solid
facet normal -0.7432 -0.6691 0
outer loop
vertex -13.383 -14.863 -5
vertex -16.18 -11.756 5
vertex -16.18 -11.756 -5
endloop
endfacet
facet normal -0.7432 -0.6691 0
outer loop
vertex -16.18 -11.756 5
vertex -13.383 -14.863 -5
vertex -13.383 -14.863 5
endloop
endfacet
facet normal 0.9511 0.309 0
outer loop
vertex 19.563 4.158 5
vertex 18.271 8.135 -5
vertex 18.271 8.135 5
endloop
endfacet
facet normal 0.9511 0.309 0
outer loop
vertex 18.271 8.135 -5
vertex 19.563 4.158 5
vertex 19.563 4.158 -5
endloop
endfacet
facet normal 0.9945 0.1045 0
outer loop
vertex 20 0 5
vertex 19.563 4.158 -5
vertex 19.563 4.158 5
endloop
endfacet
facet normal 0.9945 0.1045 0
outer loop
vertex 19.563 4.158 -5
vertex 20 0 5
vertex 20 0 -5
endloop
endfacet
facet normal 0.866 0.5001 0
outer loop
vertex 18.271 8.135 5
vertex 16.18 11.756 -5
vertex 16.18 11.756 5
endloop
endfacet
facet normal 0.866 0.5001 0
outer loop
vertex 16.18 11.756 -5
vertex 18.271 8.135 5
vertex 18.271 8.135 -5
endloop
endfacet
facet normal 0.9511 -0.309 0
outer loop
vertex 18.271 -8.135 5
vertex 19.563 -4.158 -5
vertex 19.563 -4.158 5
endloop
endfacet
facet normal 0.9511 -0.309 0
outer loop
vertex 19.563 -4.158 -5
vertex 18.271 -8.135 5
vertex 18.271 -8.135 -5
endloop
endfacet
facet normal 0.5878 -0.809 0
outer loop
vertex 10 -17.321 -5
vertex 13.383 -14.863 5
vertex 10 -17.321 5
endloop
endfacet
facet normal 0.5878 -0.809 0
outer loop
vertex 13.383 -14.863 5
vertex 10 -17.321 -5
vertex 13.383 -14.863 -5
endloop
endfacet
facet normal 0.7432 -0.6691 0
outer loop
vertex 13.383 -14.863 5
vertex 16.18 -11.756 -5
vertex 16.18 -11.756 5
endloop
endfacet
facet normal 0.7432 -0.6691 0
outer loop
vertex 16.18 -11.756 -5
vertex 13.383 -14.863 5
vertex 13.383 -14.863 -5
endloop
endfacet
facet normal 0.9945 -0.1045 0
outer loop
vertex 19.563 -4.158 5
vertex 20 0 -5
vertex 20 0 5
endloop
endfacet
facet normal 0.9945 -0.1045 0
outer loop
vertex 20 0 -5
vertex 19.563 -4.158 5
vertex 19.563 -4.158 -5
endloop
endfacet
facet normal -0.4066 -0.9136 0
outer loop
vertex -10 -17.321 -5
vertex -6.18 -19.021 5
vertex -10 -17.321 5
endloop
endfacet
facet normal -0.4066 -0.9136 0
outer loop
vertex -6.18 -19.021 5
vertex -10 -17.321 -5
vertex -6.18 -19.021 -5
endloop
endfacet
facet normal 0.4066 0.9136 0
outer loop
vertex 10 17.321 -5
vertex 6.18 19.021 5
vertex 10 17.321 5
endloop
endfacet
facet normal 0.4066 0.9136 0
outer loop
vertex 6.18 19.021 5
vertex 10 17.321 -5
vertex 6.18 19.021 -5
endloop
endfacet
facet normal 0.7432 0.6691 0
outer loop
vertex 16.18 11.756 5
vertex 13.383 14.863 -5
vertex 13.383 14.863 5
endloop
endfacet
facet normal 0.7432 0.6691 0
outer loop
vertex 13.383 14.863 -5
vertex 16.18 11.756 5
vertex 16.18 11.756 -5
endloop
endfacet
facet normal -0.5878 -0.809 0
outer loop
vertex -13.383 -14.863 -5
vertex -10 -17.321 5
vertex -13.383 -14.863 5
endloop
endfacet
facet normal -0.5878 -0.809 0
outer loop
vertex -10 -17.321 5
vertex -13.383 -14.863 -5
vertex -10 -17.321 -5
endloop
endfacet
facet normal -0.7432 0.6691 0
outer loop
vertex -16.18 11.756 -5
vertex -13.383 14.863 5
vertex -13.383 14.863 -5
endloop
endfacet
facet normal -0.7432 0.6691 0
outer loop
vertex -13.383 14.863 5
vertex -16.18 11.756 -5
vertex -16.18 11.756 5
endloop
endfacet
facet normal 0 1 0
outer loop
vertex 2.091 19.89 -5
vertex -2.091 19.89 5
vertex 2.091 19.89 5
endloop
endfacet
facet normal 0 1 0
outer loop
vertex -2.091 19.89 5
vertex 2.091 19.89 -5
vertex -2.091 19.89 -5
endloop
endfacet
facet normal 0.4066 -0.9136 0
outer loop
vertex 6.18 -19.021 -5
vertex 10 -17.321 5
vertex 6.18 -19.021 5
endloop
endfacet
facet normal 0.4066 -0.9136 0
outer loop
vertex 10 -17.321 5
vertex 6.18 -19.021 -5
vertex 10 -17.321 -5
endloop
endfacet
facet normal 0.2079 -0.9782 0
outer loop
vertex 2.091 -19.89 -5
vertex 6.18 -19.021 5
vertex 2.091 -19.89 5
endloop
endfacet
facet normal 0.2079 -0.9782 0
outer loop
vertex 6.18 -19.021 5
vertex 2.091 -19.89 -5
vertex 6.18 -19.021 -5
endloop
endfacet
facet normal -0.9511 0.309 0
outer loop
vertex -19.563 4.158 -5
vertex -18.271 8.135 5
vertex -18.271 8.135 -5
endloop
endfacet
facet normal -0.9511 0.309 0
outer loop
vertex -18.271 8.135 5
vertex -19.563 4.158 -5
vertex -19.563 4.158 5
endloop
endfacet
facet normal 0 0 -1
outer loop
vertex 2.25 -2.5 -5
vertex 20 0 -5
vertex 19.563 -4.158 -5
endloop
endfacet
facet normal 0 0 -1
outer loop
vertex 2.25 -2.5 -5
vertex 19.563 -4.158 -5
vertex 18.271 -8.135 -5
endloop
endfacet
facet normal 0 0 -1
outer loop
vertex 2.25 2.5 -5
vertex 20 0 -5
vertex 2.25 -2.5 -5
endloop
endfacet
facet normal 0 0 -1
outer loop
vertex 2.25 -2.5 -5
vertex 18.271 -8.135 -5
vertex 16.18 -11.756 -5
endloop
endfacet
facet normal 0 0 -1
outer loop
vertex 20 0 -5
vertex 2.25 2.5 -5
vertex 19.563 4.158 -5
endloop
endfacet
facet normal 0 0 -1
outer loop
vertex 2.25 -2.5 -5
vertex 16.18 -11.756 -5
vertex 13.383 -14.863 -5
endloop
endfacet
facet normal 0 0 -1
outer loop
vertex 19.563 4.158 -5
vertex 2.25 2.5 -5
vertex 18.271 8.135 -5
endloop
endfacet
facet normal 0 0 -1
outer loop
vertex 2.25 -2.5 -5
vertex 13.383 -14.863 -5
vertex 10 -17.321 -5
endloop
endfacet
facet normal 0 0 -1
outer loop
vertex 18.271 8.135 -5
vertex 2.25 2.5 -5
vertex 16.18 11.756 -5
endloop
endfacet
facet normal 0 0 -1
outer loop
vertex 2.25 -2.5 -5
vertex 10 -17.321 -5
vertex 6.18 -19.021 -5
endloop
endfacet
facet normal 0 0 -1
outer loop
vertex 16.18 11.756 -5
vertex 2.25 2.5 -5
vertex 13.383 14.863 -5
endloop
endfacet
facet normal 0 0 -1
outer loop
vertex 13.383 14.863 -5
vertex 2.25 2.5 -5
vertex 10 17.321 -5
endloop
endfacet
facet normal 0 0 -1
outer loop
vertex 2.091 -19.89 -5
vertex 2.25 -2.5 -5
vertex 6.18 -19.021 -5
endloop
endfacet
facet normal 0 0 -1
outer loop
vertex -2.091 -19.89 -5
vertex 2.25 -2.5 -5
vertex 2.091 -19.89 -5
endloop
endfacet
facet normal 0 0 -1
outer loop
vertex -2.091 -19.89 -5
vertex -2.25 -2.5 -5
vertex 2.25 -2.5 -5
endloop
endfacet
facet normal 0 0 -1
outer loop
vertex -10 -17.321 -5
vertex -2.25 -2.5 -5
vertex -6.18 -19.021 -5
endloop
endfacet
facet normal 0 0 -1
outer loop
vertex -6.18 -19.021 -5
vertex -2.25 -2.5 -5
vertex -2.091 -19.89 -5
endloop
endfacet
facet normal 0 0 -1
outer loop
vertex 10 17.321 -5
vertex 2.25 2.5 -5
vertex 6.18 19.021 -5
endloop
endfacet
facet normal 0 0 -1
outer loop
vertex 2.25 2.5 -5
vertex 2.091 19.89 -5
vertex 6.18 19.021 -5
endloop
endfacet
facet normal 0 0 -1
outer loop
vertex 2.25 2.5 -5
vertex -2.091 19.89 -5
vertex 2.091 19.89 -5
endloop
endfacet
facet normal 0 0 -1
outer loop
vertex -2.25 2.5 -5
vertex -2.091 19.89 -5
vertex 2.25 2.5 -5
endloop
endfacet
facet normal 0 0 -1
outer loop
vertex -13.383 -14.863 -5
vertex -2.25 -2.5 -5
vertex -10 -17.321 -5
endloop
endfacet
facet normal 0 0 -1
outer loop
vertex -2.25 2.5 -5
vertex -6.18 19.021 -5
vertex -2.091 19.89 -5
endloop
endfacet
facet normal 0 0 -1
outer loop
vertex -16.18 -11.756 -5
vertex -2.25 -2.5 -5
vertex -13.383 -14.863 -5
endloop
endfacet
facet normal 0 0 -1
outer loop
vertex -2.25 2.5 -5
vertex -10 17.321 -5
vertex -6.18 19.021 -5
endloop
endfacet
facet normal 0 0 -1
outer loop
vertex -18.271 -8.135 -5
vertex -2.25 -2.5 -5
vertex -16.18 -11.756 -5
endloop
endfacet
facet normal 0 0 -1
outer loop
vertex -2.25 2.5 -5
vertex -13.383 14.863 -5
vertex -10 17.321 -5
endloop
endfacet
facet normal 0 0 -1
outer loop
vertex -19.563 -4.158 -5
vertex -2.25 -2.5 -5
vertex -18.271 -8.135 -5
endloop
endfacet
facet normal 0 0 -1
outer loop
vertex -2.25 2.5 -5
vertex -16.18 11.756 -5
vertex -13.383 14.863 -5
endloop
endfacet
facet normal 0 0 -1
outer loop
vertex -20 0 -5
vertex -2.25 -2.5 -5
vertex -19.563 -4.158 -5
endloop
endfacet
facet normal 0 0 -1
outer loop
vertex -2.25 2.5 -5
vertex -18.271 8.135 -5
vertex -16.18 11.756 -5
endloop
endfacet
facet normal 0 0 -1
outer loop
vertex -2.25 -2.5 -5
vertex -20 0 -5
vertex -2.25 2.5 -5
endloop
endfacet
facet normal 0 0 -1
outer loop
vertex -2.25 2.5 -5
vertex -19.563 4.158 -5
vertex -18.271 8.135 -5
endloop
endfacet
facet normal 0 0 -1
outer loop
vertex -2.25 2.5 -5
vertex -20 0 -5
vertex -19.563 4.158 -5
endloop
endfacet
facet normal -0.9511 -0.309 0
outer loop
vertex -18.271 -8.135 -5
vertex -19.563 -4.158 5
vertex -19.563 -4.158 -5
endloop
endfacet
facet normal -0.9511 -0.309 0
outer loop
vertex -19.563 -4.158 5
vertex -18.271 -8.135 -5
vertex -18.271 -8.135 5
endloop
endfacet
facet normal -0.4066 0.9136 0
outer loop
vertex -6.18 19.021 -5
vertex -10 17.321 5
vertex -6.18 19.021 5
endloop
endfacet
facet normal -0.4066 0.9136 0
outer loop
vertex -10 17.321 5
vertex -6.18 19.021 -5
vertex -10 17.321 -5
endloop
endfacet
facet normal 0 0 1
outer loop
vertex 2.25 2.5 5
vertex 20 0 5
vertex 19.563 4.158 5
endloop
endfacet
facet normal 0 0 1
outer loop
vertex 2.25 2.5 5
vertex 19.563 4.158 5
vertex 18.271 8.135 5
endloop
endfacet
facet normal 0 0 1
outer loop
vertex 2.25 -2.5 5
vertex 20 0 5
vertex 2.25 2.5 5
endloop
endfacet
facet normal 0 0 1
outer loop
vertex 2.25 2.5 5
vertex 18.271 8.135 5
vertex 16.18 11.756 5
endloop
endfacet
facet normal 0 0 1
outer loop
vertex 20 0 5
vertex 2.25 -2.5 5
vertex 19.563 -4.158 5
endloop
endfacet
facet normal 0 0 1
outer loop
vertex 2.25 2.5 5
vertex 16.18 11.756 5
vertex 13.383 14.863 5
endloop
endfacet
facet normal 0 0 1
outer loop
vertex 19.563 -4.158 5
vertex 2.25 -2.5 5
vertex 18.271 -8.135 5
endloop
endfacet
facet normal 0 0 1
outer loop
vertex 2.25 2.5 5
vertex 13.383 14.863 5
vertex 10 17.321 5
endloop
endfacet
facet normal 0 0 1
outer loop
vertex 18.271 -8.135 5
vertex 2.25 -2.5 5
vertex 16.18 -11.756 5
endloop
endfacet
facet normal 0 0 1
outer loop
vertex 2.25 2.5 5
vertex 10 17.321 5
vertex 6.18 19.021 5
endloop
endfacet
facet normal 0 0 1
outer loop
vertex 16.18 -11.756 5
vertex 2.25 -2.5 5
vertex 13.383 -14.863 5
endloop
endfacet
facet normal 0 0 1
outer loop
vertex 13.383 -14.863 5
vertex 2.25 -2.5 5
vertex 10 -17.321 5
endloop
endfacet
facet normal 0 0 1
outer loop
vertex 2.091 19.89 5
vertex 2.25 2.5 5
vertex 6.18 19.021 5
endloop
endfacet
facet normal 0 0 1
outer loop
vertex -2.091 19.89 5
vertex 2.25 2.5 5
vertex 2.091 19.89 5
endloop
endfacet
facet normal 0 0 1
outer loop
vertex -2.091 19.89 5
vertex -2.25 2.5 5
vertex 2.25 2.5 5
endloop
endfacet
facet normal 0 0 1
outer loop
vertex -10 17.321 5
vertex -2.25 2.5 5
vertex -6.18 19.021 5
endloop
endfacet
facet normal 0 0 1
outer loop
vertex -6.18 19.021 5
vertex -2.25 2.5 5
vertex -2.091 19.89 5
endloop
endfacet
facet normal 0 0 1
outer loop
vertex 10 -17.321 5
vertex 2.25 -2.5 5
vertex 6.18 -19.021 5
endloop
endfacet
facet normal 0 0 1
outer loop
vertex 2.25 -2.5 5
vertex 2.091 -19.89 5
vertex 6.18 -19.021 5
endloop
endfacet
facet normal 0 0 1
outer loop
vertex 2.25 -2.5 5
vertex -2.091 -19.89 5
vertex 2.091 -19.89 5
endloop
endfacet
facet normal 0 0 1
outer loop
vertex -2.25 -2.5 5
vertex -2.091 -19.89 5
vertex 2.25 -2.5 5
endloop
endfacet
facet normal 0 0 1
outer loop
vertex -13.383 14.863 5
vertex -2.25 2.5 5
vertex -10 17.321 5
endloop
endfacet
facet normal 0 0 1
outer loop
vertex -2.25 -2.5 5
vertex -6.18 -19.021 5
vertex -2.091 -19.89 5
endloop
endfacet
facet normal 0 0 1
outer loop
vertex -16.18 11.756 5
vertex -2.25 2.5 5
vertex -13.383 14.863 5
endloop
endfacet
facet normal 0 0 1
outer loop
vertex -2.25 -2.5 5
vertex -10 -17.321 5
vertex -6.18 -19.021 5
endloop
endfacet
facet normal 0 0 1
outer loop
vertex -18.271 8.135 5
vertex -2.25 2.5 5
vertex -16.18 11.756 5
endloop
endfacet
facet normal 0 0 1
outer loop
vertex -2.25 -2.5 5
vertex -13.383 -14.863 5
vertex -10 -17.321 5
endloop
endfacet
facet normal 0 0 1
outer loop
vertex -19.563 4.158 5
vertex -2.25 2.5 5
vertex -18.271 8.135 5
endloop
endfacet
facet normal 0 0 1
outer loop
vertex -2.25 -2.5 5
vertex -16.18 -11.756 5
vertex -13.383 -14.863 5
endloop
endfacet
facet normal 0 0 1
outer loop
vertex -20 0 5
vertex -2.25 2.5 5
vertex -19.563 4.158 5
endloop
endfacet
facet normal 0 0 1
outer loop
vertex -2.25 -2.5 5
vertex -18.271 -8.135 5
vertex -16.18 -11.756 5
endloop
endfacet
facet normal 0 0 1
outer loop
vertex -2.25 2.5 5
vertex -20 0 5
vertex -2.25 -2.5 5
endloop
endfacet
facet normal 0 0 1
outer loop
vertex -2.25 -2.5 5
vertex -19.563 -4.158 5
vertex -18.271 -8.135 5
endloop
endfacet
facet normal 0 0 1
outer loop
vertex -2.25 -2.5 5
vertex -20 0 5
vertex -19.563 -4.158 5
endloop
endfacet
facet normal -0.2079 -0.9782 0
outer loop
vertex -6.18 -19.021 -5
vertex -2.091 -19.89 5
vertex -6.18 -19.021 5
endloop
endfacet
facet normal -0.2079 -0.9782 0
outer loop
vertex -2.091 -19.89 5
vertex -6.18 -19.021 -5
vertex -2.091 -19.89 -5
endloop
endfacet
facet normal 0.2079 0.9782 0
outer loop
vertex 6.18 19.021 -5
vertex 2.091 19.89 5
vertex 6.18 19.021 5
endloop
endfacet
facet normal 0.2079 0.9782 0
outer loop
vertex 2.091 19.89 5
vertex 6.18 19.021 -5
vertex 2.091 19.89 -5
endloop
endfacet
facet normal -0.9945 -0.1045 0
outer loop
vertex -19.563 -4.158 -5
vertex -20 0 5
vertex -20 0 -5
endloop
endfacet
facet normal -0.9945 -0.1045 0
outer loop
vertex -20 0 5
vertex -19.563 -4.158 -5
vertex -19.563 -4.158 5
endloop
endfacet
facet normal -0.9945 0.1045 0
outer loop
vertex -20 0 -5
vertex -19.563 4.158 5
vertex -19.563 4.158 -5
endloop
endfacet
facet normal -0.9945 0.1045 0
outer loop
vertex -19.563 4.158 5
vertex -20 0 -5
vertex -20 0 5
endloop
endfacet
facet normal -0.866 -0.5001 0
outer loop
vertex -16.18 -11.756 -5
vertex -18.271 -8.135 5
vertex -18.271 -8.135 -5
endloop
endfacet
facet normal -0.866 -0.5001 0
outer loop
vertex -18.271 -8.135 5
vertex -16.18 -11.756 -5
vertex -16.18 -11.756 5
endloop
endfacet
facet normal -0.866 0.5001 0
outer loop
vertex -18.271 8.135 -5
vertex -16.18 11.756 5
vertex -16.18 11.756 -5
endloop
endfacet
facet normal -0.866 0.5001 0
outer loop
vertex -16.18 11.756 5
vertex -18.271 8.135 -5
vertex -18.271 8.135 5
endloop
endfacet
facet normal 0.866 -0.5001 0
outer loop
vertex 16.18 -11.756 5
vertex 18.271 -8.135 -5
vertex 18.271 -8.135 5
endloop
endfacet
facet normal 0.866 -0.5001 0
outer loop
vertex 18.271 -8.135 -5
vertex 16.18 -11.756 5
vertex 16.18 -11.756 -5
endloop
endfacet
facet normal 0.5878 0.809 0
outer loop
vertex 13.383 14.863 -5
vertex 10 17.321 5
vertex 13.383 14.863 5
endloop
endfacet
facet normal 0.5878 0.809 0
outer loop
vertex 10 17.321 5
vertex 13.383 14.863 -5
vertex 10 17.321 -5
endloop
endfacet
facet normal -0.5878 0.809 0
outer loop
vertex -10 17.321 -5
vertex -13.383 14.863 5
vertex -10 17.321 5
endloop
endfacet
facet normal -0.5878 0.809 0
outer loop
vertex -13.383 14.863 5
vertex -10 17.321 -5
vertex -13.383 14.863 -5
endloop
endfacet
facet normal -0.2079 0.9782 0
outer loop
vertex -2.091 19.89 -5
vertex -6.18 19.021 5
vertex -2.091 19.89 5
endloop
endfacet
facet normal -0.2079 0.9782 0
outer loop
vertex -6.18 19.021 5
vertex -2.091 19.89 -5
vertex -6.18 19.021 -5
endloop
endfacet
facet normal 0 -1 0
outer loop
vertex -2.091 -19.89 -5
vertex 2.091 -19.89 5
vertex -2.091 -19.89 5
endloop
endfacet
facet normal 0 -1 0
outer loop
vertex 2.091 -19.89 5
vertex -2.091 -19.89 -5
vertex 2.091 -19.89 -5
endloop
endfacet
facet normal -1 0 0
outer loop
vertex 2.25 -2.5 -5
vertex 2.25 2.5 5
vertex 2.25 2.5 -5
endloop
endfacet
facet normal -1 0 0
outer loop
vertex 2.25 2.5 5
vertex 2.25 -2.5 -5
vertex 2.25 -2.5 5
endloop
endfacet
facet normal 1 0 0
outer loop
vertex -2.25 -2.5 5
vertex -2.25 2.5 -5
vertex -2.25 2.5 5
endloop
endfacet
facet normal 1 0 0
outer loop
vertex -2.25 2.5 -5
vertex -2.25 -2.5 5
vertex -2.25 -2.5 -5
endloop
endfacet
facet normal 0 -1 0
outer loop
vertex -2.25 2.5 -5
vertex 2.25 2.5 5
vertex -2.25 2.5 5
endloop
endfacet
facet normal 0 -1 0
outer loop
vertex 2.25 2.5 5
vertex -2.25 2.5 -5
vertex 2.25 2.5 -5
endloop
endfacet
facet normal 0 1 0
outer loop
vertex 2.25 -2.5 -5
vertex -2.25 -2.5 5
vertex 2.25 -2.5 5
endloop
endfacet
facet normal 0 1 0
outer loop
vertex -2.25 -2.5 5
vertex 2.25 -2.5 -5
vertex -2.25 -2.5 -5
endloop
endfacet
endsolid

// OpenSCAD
difference(){
// wheel height and diamter (2*r) are not modeled accurately however the central hole is and should fit on to the shafts we have.   
cylinder(h=10,r=20, center=true);
cube([4.5,5,110], center=true);}
